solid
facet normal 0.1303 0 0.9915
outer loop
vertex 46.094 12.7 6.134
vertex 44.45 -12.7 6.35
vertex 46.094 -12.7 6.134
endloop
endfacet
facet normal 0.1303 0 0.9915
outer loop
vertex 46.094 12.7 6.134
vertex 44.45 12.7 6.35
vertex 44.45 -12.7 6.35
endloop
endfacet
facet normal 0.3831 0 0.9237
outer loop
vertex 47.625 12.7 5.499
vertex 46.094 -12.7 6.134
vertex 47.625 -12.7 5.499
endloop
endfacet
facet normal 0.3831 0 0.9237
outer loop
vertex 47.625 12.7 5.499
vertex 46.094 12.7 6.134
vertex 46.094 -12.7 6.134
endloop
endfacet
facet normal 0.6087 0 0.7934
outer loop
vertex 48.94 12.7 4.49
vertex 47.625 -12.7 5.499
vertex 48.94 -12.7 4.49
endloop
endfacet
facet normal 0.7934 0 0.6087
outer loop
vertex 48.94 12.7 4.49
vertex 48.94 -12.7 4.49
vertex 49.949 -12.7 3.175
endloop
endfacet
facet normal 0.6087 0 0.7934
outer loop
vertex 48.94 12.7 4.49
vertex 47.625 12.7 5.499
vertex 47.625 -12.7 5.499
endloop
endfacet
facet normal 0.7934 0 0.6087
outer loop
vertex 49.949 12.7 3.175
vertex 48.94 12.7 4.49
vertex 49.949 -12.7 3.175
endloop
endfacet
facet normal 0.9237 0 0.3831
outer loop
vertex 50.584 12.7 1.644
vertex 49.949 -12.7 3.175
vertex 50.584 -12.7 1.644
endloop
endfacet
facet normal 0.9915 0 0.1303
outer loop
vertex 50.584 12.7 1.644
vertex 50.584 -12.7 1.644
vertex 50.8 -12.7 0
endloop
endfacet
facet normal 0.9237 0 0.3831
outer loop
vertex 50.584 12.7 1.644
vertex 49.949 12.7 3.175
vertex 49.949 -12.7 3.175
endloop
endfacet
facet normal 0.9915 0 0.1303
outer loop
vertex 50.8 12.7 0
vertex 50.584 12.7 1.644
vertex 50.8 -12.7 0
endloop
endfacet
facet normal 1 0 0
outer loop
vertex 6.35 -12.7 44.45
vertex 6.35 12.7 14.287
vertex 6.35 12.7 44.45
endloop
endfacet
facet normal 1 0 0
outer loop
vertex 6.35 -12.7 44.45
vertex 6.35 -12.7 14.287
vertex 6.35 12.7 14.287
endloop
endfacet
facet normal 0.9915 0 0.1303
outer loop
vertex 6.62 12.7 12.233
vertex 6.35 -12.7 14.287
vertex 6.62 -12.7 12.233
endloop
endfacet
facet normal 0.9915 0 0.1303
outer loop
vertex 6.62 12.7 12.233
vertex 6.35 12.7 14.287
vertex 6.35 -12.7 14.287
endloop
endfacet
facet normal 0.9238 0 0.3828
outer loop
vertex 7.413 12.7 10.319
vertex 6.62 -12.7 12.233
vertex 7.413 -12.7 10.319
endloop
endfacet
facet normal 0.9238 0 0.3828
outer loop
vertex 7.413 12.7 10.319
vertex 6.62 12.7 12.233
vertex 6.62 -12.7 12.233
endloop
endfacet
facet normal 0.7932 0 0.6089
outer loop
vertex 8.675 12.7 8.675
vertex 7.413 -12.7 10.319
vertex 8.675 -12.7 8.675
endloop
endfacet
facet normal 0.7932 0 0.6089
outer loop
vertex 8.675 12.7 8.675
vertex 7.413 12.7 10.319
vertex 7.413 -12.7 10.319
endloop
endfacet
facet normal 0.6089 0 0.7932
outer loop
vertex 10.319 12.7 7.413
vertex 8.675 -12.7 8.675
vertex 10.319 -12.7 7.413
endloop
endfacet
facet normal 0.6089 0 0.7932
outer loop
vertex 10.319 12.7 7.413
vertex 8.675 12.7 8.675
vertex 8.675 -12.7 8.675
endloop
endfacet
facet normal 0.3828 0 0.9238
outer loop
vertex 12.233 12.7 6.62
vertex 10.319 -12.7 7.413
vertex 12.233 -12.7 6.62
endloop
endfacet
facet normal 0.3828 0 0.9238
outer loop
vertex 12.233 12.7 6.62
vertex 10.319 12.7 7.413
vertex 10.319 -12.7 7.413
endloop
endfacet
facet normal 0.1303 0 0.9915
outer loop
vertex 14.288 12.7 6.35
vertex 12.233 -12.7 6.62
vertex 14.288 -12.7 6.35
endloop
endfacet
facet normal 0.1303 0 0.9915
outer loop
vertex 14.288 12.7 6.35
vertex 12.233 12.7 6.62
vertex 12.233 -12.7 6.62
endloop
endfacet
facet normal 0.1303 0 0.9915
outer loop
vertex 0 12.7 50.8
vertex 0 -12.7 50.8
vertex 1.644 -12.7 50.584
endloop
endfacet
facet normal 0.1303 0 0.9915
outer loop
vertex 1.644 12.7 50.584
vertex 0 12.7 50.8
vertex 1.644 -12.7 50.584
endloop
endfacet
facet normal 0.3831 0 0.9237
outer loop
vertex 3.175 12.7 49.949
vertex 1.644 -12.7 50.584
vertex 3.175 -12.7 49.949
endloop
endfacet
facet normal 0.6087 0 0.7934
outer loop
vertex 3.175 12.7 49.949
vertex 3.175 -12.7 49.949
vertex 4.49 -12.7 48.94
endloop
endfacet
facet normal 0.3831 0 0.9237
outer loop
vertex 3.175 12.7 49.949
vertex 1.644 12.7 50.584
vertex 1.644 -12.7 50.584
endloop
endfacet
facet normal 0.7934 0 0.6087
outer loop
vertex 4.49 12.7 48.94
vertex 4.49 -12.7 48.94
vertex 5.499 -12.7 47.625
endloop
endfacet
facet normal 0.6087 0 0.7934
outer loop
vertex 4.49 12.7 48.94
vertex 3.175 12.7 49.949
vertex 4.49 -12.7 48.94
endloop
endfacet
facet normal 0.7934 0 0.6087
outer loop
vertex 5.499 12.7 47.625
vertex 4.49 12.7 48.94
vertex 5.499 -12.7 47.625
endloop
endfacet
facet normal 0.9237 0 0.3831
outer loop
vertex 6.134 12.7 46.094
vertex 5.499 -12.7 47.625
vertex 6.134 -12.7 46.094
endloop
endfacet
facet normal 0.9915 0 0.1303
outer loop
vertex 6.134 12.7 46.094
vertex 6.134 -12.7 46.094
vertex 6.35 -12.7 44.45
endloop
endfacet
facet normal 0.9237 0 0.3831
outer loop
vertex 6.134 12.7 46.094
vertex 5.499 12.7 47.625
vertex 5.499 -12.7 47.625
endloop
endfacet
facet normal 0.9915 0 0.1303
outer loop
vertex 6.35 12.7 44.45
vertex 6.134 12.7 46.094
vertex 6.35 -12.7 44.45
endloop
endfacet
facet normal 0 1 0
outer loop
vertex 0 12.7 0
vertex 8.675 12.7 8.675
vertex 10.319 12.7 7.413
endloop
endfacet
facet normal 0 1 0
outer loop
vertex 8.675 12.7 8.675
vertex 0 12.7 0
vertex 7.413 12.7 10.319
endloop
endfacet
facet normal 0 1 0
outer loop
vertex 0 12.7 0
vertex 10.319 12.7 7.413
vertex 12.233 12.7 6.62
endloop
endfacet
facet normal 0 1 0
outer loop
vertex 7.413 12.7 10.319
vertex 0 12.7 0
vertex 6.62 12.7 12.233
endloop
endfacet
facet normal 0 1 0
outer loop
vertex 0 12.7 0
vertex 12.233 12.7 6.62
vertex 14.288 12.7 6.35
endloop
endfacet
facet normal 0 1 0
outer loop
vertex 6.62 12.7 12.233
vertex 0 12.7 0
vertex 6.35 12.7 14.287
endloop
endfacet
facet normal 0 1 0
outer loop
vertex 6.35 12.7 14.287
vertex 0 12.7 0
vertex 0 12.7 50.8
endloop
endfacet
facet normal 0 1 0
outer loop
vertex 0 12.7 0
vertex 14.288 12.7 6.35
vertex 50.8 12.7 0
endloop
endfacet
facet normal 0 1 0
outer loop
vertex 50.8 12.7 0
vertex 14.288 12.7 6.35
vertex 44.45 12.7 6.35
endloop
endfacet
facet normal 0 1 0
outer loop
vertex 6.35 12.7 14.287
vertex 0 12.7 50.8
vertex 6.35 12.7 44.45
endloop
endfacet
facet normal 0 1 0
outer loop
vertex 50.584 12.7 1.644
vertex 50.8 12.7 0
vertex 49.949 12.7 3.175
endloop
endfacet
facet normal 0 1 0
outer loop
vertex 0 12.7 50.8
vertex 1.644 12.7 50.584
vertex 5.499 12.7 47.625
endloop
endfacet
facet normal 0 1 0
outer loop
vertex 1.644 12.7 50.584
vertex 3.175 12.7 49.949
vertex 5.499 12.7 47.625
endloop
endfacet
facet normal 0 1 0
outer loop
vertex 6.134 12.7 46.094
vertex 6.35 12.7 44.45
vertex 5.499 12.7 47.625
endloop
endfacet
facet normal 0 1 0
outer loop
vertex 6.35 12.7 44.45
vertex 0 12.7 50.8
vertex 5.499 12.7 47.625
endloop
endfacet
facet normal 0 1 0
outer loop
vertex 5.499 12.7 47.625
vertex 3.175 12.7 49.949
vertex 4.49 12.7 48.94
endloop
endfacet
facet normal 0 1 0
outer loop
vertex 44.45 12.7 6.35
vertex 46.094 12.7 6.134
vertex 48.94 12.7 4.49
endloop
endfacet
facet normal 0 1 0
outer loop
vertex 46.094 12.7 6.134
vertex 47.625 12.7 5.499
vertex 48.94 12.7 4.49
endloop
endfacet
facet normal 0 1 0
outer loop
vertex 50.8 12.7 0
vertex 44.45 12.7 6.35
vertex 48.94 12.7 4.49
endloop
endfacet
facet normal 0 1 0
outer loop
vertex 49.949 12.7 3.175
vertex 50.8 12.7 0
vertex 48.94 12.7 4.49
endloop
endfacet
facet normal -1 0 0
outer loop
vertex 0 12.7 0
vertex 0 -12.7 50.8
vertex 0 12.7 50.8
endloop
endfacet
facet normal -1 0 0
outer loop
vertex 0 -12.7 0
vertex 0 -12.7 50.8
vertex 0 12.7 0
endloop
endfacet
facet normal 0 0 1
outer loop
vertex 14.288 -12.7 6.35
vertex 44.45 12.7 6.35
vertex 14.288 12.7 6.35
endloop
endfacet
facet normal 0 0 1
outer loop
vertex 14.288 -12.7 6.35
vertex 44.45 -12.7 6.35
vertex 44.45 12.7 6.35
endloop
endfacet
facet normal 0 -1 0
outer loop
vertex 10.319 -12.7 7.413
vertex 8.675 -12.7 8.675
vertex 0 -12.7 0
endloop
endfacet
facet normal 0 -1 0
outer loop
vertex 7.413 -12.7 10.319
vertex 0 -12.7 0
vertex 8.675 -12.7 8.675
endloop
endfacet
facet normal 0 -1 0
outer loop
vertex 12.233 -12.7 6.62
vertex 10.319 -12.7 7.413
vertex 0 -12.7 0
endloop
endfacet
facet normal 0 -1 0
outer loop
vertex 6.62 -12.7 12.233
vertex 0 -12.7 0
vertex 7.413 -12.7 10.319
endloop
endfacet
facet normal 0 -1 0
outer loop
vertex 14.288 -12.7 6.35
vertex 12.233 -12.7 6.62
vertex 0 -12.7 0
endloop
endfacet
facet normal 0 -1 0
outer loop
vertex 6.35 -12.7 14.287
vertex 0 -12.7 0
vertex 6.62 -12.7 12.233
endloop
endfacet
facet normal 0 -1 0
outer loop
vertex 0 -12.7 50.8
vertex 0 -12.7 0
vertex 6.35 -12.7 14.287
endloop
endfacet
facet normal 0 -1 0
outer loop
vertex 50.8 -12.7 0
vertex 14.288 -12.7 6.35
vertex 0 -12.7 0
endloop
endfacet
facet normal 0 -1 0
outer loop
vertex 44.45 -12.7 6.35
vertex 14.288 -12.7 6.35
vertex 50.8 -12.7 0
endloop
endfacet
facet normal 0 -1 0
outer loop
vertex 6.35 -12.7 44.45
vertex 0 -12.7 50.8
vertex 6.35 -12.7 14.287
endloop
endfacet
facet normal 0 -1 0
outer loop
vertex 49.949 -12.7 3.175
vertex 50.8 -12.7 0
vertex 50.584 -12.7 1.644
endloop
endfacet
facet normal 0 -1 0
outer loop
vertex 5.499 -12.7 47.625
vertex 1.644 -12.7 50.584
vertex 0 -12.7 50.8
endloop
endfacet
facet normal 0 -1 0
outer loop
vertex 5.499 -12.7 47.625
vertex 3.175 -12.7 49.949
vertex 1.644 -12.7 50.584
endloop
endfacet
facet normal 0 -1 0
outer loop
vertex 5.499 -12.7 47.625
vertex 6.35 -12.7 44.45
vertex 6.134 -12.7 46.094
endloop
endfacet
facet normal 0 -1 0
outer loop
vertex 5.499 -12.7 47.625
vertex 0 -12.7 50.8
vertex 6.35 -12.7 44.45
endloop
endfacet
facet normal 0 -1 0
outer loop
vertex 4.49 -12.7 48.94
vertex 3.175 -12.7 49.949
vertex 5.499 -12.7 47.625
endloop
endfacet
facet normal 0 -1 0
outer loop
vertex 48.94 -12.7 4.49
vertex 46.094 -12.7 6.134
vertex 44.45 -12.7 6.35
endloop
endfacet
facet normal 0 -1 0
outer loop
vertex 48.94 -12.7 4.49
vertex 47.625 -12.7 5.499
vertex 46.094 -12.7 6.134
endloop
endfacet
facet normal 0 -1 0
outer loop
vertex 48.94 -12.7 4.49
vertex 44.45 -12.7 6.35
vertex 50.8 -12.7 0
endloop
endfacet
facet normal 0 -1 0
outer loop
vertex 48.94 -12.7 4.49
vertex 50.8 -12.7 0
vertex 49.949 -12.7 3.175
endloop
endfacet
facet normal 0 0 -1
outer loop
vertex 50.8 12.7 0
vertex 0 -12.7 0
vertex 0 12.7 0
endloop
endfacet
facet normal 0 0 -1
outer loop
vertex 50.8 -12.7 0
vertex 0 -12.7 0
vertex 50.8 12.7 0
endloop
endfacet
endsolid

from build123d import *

# Parameters (mm, degrees)
F1_DEPTH = 12.7
F2_R     = 6.34999
F3_R     = 7.9375


# Not quite as in the source:
# - a fillet or chamfer is up to 0.001 mm smaller than in the source, because OpenCascade refuses the exact size


with BuildPart() as f1:
    # F0 (on Front) → F1 (new body, symmetric)
    with BuildSketch(Plane.XZ):
        Polygon((6.35, 50.8), (0, 50.8), (0, 0), (50.8, 0), (50.8, 6.35), (6.35, 6.35), align=None)
    extrude(amount=F1_DEPTH, both=True)

    # F2 (radius 6.35 in the source; OpenCascade refuses exactly that, so slightly less here)
    f2_edges = [f1.edges().sort_by_distance(p)[0] for p in [
        (6.35, 0, 50.8),
        (50.8, 0, 6.35),
    ]]
    fillet(f2_edges, radius=F2_R)

    # F3
    f3_edges = [f1.edges().sort_by_distance(p)[0] for p in [
        (6.35, 0, 6.35),
    ]]
    fillet(f3_edges, radius=F3_R)


solid = f1.part
